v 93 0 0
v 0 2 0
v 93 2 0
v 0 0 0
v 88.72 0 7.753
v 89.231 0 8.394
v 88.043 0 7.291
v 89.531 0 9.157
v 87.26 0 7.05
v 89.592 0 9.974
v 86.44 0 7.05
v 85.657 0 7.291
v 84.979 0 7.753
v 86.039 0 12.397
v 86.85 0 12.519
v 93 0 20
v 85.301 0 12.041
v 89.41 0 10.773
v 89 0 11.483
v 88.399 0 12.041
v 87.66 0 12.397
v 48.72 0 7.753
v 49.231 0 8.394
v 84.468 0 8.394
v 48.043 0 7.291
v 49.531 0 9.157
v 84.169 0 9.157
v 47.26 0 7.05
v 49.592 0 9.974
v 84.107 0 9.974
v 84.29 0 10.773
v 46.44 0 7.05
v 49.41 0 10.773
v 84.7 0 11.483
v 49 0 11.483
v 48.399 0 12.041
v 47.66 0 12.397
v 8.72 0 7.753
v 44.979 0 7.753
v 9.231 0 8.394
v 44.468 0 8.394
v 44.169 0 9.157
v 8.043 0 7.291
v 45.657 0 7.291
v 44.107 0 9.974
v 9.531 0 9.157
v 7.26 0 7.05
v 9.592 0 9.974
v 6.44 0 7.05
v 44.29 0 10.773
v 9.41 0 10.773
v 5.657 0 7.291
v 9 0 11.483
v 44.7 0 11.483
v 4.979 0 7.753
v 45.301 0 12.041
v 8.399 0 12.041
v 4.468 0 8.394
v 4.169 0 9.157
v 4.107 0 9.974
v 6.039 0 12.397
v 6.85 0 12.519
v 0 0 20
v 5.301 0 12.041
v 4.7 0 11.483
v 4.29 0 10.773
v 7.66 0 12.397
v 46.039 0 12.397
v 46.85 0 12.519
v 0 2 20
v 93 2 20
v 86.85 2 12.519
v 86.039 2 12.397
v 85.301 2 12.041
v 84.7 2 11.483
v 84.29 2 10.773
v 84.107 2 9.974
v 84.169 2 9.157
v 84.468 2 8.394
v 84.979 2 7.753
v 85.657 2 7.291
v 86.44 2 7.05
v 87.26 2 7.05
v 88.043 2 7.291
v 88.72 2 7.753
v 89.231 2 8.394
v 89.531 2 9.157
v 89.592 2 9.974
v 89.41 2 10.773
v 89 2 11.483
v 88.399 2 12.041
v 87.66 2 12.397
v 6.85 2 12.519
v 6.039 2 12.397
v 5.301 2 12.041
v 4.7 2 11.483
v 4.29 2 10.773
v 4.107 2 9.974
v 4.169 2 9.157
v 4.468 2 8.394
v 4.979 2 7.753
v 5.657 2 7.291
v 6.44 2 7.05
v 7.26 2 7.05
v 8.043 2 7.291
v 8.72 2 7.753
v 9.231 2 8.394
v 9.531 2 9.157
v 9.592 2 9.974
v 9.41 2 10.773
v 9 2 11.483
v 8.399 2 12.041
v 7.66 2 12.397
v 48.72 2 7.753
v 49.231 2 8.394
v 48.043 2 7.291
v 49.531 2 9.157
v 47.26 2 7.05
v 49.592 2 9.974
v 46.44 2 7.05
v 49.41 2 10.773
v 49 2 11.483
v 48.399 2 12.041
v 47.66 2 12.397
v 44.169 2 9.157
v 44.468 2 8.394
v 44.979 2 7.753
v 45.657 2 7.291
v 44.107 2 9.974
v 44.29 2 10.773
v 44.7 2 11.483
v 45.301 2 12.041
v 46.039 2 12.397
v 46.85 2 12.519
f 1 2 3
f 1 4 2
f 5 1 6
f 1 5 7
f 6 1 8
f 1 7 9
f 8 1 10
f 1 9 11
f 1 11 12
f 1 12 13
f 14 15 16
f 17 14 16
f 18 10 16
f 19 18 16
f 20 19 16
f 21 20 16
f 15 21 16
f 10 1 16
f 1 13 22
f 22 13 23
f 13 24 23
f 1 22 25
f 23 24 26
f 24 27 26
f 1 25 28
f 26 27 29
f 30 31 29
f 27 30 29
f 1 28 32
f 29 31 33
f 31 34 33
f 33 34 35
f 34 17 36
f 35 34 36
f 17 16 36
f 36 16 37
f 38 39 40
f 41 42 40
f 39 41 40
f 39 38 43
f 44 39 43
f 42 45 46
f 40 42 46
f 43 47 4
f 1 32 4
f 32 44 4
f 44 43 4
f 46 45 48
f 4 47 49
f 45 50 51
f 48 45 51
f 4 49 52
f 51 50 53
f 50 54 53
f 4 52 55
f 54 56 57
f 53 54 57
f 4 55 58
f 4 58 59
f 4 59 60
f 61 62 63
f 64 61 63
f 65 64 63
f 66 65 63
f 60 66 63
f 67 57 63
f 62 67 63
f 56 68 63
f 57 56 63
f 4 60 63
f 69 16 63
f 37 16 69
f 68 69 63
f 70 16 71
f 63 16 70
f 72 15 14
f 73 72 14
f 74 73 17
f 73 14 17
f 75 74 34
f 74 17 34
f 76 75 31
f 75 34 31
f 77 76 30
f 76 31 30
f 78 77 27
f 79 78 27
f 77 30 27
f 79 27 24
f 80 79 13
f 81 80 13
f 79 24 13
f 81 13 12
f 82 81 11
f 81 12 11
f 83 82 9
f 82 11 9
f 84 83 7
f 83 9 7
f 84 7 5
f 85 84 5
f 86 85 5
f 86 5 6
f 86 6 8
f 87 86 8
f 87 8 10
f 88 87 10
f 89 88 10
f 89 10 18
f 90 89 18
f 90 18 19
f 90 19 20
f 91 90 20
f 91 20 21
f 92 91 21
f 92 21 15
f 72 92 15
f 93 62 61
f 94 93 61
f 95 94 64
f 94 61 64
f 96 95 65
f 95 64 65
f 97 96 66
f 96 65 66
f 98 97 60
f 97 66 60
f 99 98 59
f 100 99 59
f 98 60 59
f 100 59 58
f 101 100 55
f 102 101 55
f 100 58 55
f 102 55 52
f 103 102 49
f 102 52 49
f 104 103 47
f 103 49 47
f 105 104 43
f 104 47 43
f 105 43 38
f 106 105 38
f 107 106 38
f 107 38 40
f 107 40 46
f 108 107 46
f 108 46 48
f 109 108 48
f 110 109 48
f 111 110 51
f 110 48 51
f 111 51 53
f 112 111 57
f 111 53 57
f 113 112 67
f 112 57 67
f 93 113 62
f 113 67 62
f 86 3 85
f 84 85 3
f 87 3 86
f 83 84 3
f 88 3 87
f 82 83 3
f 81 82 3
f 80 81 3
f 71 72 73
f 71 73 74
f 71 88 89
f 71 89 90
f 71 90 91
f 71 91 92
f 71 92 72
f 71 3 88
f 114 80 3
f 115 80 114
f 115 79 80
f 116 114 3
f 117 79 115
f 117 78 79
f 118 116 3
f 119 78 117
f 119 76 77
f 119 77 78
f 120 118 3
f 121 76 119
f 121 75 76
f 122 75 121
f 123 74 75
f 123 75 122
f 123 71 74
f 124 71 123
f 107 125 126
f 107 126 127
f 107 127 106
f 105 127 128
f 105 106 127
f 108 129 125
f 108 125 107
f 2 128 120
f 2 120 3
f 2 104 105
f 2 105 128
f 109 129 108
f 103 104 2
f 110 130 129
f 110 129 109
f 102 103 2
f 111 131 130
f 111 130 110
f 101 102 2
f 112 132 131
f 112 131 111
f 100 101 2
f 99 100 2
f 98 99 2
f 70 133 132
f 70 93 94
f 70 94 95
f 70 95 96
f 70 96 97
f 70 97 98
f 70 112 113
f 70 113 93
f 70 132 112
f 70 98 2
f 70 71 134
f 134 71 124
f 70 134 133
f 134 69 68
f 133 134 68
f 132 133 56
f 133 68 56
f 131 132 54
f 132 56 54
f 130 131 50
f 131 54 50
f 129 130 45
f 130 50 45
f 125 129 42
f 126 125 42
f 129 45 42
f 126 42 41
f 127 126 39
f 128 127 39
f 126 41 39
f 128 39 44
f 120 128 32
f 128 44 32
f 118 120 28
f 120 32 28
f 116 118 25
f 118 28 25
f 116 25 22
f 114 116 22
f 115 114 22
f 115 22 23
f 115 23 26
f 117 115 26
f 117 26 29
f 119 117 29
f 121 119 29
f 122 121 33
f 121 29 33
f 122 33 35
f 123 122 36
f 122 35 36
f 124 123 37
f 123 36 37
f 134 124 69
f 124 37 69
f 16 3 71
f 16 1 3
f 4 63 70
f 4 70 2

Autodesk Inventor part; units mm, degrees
ref_plane "YZ Plane" through (0, 0, 0) normal (1, 0, 0) x (0, 1, 0)
ref_plane "XZ Plane" through (0, 0, 0) normal (0, 1, 0) x (-1, 0, 0)
ref_plane "XY Plane" through (0, 0, 0) normal (0, 0, 1) x (1, 0, 0)
sketch "Sketch1" plane through (0, 0, 0) normal (0, 1, 0) x (-1, 0, 0)
  line L0 (0, 0) -> (-93, 0)
  line L1 (-93, 0) -> (-93, 20)
  line L2 (-93, 20) -> (0, 20)
  line L3 (0, 20) -> (0, 0)
  dimension "d0" = 93
  dimension "d1" = 20
extrude "Extrusion1" add sketch "Sketch1" along normal blind 2
hole "Hole1" at (6.8497, 2, 9.7688) direction (0, -1, 0) diameter 5.5 end through all
pattern_linear "Rectangular Pattern1" count 3 spacing 40 along (1, 0, 0) of "Hole1"
properties part number "flatbarx2" material "Aluminum 6061"
